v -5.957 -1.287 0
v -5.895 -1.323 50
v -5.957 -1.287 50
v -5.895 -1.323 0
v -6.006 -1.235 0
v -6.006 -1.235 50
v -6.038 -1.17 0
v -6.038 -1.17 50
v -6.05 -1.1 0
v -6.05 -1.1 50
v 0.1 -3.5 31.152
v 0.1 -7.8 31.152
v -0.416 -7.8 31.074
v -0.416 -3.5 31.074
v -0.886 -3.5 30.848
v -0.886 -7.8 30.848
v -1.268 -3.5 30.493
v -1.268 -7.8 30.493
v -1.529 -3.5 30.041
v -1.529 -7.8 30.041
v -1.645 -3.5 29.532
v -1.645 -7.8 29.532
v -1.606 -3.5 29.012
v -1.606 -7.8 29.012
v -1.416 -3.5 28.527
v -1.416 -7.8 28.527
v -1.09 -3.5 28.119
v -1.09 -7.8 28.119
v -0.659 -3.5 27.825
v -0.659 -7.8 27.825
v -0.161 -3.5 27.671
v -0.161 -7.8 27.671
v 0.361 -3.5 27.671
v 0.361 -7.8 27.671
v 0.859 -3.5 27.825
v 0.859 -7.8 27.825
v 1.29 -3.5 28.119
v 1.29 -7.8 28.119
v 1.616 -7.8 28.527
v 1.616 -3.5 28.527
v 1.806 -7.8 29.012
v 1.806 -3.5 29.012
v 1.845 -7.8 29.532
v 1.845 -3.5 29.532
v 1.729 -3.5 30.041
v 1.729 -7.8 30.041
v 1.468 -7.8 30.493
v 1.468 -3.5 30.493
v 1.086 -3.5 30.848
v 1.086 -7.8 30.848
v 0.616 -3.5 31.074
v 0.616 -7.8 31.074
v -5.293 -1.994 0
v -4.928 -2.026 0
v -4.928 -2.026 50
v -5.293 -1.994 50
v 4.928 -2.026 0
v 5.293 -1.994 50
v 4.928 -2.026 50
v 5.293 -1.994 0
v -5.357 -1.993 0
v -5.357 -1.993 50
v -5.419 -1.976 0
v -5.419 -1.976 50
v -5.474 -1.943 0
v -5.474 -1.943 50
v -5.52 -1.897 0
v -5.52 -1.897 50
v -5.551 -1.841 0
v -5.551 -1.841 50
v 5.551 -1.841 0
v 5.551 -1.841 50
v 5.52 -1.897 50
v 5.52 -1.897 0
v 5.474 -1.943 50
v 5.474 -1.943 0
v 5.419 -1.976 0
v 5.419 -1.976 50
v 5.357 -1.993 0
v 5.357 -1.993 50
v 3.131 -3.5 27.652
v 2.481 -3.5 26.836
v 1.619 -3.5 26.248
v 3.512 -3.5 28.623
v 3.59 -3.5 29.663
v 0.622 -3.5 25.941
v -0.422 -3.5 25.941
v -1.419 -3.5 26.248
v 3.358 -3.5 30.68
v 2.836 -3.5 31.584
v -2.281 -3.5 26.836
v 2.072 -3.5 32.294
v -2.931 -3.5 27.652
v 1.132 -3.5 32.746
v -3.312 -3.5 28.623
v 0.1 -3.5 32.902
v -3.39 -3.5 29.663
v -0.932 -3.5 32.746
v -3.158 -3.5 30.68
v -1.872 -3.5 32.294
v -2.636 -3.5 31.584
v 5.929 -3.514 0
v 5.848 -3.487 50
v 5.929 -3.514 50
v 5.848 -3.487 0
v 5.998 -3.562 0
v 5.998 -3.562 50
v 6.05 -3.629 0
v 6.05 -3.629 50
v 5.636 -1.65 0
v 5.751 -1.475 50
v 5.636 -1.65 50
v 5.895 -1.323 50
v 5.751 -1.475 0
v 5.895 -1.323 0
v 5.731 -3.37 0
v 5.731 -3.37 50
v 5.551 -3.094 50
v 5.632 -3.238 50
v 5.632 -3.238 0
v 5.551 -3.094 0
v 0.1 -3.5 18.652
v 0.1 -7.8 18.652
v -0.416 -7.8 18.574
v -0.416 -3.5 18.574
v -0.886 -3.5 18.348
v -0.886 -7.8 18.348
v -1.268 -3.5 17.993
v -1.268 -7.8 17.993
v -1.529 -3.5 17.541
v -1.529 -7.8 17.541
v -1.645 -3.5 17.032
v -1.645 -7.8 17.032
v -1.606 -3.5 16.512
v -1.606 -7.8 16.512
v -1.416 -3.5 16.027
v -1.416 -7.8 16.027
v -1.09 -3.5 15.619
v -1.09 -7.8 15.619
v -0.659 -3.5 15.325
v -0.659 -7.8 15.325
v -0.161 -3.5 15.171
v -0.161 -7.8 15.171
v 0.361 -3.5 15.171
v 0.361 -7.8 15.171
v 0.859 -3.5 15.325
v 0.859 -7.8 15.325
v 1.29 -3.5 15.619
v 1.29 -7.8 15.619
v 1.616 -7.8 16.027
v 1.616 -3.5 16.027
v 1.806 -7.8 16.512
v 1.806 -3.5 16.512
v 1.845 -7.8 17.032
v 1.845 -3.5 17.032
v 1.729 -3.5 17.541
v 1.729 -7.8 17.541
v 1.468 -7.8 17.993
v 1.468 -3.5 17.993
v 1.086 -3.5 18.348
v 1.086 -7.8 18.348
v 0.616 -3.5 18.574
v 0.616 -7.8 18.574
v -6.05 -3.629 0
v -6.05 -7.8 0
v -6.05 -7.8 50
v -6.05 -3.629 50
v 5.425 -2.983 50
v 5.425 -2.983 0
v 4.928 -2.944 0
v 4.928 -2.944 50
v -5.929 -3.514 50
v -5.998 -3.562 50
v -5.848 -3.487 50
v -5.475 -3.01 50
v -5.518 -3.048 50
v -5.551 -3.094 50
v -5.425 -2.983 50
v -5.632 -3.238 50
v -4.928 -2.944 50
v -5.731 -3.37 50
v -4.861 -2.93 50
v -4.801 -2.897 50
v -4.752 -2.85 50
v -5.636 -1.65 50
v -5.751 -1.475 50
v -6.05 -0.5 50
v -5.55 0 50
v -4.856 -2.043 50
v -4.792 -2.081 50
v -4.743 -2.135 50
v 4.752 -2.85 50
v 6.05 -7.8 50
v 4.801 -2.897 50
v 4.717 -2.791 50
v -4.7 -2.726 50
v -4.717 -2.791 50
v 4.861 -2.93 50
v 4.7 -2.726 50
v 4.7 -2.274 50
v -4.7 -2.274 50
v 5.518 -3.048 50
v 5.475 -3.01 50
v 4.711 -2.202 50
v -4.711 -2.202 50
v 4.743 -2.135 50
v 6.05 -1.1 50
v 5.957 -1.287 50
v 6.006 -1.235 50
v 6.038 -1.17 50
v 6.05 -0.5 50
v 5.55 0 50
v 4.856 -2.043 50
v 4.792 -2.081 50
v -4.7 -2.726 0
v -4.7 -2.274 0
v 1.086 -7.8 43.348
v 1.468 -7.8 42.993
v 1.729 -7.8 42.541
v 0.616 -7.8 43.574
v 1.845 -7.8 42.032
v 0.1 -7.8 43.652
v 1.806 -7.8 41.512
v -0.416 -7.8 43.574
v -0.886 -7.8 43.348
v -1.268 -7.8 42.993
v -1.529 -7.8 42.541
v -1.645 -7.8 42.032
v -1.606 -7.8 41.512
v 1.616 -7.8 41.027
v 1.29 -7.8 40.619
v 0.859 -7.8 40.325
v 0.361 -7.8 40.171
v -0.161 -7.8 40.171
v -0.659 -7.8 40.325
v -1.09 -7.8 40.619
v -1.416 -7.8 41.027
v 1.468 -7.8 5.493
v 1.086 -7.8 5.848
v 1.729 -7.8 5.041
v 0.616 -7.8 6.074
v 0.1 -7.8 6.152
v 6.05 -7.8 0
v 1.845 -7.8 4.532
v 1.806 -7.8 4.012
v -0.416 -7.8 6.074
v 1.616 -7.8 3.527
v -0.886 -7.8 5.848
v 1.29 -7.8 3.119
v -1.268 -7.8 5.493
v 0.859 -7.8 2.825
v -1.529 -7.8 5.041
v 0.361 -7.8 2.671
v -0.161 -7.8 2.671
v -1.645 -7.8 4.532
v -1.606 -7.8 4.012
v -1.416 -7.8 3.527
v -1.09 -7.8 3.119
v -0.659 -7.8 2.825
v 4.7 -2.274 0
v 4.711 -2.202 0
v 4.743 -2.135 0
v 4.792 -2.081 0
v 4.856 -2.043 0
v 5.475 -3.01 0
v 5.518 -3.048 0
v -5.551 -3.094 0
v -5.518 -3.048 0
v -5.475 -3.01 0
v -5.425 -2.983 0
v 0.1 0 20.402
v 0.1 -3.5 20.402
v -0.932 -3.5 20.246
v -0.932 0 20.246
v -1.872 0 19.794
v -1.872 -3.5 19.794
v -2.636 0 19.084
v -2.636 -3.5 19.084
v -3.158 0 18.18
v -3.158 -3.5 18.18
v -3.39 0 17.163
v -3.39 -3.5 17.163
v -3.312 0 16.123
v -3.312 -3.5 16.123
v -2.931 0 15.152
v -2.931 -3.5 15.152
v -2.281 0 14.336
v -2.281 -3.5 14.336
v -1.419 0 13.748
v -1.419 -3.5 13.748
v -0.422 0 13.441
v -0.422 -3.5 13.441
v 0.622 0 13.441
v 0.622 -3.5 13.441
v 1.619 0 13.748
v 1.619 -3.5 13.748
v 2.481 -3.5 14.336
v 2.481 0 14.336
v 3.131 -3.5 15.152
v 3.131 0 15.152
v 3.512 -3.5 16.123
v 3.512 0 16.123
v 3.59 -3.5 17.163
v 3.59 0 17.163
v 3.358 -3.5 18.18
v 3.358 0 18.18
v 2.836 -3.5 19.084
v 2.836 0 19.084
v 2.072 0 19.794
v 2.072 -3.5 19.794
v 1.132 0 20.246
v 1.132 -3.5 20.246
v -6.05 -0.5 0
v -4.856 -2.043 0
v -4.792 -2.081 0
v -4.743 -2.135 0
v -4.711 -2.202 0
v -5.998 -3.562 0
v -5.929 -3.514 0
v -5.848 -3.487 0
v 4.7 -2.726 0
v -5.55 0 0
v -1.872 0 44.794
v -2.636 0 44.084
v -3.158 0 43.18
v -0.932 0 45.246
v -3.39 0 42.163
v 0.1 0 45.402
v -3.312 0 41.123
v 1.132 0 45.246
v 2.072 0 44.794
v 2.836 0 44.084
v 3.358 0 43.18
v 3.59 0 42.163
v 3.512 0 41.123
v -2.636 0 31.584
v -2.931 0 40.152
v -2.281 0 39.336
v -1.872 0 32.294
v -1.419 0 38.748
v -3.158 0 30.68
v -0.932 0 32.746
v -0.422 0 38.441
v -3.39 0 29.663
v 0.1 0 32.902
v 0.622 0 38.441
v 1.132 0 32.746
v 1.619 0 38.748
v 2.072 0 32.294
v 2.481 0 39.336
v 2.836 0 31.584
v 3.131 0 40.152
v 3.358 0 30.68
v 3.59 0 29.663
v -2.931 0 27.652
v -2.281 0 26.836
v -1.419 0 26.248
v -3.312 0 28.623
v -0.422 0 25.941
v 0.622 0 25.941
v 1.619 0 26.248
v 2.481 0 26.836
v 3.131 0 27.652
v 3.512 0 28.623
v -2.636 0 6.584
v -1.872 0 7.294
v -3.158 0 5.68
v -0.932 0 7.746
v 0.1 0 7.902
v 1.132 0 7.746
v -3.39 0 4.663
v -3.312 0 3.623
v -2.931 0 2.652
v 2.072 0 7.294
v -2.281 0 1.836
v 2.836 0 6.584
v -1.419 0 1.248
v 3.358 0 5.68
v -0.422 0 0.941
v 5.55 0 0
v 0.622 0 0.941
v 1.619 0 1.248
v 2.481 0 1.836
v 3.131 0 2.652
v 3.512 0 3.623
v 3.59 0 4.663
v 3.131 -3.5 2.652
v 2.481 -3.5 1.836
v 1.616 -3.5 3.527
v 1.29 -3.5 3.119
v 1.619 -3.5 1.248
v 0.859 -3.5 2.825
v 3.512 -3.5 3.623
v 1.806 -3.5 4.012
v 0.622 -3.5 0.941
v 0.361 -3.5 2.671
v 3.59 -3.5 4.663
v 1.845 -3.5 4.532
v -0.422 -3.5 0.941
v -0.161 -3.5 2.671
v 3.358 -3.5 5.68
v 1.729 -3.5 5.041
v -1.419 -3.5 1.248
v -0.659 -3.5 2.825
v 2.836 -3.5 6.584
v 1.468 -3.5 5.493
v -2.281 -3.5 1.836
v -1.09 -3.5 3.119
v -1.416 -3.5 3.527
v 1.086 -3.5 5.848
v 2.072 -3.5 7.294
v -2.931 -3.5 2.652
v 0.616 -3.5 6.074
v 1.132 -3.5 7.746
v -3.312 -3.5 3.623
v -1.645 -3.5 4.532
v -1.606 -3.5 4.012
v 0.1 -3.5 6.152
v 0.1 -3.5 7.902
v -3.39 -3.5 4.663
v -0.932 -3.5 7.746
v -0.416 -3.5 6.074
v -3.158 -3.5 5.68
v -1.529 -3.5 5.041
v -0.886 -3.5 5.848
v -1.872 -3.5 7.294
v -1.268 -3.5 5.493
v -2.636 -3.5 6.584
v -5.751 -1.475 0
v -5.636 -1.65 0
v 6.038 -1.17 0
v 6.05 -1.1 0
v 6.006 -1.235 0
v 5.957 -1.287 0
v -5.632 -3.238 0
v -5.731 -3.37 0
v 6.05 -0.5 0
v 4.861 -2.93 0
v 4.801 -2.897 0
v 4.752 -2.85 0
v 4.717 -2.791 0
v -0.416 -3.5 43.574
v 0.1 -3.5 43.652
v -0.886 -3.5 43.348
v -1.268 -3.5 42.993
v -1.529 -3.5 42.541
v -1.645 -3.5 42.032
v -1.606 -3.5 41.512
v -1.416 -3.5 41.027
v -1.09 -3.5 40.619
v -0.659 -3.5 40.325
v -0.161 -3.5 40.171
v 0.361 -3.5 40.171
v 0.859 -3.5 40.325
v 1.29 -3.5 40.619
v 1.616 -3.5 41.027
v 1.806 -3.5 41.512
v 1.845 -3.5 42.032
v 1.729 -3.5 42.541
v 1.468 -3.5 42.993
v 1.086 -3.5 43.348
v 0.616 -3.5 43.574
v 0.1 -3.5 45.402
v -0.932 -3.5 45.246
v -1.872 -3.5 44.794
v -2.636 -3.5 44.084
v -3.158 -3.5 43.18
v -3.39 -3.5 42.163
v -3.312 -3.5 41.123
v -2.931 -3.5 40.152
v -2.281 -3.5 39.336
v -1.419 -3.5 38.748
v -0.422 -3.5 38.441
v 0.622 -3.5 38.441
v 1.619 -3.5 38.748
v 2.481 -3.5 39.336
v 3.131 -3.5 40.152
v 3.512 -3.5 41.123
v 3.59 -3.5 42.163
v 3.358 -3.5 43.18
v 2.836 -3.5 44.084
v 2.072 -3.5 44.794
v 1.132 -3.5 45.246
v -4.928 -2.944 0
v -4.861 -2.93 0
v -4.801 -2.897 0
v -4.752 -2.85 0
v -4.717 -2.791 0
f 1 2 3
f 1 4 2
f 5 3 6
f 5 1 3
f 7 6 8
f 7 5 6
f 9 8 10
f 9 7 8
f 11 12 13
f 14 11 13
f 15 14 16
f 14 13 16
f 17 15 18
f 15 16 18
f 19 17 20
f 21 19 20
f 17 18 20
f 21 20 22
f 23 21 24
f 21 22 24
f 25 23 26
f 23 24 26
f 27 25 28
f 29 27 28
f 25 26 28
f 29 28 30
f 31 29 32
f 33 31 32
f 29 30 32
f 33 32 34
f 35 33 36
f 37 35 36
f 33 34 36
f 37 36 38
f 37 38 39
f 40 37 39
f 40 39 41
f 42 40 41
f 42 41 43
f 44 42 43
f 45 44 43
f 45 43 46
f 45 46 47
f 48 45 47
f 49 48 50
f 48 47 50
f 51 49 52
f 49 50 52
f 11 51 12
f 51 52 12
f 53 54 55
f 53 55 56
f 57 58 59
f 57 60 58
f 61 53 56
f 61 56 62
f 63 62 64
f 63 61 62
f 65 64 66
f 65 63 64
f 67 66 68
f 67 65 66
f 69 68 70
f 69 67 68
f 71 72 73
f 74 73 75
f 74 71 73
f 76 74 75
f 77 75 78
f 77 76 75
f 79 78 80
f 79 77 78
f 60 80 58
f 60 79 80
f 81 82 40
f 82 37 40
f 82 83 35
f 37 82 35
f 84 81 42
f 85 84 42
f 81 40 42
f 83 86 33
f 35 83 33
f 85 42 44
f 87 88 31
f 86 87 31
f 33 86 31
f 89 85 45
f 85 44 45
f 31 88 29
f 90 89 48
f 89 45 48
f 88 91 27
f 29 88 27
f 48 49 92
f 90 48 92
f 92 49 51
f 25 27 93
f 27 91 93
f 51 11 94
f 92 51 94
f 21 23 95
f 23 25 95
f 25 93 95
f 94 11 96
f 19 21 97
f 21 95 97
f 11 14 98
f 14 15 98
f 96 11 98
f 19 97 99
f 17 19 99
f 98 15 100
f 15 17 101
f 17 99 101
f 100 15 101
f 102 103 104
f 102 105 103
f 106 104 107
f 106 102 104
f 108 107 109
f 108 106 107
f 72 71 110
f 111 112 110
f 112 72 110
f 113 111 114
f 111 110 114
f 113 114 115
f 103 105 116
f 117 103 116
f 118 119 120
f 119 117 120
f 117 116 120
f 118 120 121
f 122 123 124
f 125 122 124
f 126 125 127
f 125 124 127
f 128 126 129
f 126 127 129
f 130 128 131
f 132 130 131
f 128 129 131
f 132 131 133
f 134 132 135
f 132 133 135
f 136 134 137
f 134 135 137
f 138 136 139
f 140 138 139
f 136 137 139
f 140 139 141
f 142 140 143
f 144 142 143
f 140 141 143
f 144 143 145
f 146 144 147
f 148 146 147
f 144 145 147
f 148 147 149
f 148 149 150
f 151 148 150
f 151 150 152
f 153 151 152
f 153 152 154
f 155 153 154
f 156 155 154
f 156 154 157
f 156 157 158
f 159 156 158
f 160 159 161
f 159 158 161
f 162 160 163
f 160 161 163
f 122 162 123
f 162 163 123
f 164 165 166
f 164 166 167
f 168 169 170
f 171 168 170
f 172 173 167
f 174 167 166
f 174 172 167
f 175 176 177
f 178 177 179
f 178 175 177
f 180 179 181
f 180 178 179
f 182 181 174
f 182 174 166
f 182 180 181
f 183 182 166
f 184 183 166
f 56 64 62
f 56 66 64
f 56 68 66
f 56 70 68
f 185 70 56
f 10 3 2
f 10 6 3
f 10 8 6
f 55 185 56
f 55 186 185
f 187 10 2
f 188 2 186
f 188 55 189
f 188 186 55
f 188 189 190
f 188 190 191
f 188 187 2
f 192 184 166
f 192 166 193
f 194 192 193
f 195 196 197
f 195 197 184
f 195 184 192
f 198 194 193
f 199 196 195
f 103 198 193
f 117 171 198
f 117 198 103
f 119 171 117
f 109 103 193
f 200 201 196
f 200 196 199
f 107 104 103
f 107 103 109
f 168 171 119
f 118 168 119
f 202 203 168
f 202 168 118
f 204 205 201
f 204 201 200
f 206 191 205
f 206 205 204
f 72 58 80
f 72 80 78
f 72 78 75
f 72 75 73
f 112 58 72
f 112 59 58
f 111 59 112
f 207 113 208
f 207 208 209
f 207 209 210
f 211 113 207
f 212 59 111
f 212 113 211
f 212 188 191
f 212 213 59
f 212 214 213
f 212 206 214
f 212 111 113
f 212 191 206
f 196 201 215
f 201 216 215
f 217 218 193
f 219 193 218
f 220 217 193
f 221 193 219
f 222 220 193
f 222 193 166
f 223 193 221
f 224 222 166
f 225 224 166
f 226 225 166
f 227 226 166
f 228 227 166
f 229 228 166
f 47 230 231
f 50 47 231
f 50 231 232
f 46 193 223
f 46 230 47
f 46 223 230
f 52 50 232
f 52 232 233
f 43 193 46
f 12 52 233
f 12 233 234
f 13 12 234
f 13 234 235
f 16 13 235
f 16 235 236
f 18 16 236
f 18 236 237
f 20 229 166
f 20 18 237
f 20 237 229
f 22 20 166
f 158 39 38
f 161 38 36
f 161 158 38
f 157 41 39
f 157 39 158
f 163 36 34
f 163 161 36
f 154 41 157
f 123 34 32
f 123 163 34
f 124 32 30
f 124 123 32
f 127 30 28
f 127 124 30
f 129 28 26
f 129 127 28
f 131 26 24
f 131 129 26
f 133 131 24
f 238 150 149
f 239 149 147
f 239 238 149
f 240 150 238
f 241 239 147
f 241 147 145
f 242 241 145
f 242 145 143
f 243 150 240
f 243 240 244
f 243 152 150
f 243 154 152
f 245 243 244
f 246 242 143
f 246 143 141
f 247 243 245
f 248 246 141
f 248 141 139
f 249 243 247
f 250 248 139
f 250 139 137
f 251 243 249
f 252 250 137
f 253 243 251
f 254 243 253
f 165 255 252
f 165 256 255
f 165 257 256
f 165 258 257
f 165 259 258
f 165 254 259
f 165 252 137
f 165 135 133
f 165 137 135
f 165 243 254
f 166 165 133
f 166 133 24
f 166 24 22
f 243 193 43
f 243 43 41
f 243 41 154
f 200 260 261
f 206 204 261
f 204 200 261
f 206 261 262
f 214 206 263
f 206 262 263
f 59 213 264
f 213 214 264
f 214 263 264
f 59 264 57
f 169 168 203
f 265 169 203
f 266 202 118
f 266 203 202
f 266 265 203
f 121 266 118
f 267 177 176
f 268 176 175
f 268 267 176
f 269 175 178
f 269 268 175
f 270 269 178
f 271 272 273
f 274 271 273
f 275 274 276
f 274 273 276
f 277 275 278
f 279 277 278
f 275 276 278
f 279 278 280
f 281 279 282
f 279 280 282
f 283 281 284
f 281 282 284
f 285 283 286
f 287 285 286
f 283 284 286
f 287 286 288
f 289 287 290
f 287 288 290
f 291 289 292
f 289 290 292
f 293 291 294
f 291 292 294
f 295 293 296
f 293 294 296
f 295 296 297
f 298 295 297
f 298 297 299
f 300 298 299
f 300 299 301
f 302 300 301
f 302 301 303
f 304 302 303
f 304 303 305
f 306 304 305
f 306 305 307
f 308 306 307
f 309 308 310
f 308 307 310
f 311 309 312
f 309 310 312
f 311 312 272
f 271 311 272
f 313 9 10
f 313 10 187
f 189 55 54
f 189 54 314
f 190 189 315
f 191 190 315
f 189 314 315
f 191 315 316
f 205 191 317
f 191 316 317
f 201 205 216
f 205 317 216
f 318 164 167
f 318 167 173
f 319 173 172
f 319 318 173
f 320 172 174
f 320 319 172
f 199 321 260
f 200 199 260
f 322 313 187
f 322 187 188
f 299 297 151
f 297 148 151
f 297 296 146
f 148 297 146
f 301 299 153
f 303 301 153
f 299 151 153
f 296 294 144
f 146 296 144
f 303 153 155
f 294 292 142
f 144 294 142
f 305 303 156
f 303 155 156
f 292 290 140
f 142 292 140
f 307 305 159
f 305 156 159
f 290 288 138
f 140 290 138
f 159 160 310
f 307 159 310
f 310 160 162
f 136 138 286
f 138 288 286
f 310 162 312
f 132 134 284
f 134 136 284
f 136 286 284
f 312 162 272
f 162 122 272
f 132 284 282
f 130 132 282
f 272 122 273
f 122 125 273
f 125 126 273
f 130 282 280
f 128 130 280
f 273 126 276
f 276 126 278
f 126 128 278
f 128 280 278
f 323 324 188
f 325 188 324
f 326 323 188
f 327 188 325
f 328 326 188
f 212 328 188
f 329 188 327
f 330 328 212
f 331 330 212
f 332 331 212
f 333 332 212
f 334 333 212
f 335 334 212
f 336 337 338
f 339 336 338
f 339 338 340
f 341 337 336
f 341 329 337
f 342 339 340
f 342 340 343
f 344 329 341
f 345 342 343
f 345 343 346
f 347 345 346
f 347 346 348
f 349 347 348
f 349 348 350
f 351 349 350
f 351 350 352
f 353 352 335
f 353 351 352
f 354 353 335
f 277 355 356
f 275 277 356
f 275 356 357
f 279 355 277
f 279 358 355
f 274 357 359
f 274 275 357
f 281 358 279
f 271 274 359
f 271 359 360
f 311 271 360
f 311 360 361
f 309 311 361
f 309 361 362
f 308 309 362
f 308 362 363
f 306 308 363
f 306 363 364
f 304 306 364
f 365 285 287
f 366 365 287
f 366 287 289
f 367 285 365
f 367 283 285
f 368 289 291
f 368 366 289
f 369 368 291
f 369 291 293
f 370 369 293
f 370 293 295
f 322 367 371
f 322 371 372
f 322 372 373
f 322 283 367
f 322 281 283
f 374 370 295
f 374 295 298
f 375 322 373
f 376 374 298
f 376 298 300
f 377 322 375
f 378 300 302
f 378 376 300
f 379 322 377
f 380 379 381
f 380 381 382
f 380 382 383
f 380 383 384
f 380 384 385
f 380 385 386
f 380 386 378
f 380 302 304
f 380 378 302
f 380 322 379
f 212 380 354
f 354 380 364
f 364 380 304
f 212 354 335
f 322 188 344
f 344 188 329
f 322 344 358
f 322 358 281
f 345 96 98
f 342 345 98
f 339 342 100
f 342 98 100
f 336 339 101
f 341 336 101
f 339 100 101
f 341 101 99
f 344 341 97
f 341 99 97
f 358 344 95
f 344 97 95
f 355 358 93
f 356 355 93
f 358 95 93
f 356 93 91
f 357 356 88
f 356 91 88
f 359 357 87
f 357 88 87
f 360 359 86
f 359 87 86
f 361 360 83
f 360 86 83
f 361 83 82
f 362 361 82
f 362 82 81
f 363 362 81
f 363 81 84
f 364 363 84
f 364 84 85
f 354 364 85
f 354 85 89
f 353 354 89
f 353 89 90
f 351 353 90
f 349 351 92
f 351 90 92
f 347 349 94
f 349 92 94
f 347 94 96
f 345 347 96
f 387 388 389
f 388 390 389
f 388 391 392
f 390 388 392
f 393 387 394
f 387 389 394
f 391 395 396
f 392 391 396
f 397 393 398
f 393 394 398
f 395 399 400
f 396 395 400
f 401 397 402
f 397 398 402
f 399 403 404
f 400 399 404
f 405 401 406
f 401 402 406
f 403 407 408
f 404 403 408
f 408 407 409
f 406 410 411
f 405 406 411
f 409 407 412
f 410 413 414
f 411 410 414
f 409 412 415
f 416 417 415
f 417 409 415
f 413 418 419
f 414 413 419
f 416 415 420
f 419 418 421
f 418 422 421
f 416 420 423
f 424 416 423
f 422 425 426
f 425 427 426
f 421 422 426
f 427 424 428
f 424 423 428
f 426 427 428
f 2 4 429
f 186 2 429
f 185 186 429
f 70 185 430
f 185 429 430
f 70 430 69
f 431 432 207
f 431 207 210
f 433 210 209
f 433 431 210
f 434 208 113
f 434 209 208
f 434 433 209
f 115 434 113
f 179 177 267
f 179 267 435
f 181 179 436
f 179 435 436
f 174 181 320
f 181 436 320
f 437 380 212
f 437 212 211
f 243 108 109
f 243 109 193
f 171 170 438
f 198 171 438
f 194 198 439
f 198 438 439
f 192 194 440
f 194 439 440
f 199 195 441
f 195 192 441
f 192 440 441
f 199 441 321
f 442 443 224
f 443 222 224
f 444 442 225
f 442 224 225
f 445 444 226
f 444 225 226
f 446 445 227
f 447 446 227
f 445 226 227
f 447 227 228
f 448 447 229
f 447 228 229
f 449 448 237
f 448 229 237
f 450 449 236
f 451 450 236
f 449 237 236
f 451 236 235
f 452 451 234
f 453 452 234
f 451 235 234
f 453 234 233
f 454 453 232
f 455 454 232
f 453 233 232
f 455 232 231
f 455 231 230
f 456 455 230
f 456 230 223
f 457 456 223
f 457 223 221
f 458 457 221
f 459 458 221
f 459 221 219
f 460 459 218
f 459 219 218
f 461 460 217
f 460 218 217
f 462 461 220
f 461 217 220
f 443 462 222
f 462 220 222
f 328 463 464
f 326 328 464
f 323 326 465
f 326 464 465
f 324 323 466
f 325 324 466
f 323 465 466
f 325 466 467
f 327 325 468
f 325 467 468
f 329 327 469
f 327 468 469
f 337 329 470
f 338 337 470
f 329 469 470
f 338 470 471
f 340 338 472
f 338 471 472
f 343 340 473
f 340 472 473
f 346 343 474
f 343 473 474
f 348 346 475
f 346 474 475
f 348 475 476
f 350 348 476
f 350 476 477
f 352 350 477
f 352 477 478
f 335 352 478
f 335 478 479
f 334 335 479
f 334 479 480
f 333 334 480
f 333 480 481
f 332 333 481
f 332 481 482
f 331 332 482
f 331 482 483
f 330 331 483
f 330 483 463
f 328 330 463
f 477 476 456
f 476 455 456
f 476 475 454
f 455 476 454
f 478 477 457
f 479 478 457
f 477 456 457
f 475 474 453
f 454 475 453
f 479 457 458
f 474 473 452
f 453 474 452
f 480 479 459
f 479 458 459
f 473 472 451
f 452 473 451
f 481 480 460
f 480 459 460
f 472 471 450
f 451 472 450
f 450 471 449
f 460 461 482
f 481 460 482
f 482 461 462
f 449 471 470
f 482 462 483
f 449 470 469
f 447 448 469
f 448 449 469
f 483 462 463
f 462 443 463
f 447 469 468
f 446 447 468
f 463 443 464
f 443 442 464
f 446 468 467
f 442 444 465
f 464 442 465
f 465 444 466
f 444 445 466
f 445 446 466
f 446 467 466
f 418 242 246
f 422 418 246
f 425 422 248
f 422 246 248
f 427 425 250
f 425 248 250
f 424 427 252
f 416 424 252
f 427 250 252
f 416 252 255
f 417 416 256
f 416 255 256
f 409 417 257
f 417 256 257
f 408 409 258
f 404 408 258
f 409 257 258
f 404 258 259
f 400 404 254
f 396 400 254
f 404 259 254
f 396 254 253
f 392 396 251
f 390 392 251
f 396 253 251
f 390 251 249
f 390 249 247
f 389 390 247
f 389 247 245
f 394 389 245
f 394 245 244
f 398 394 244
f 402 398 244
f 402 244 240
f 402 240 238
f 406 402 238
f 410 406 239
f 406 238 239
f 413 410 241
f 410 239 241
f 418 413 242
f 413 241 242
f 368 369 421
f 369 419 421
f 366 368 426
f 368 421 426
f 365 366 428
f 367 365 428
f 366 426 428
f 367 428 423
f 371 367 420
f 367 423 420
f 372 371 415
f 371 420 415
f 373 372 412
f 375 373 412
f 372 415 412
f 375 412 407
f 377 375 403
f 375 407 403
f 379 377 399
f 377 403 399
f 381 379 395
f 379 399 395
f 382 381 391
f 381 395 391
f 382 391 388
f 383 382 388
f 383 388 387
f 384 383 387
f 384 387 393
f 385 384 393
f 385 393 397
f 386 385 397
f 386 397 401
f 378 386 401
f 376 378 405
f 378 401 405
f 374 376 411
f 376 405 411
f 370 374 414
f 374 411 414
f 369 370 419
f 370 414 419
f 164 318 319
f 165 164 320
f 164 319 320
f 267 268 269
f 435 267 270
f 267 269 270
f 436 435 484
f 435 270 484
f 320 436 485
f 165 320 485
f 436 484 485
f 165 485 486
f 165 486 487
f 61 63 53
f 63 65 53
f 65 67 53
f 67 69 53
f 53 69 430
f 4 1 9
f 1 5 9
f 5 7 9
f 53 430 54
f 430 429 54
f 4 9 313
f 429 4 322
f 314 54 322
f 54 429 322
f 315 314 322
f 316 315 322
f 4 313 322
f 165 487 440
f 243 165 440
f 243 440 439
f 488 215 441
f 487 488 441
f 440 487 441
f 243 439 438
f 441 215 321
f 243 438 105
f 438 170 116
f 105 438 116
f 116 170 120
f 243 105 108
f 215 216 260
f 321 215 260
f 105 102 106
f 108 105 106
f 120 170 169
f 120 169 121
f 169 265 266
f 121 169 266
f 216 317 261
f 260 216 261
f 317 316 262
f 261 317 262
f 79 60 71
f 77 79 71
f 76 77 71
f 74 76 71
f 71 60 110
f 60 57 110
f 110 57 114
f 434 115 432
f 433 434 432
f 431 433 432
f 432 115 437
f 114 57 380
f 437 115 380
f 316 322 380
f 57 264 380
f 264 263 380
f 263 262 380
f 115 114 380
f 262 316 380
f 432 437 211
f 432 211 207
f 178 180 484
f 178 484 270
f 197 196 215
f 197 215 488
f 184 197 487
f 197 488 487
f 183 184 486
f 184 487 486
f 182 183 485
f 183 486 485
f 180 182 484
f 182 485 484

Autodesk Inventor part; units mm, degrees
ref_plane "YZ Plane" through (0, 0, 0) normal (1, 0, 0) x (0, 1, 0)
ref_plane "XZ Plane" through (0, 0, 0) normal (0, 1, 0) x (-1, 0, 0)
ref_plane "XY Plane" through (0, 0, 0) normal (0, 0, 1) x (1, 0, 0)
ref_plane "Work Plane1" through (0, 0, 0) normal (0, 0, 1) x (1, 0, 0)
sketch "Sketch1" plane through (0, 0, 0) normal (0, 0, 1) x (1, 0, 0)
  line L0 (0, 0) -> (5.55, 0)
  line L1 (6.05, -7.8) -> (0, -7.8)
  line L2 (0, -7.8) -> (0, 0)
  line L3 (5.55, 0) -> (6.05, -0.5)
  arc A0 (6.05, -3.6294) -> (5.8482, -3.4873) centre (5.8013, -3.7683) ccw
  arc A1 (5.5514, -3.0941) -> (5.8482, -3.4873) centre (6.6343, -2.5853) ccw
  arc A2 (5.5514, -3.0941) -> (5.425, -2.9829) centre (5.3332, -3.2146) ccw
  line L4 (5.425, -2.9829) -> (4.928, -2.9441)
  arc A3 (4.7, -2.7255) -> (4.928, -2.9441) centre (4.9475, -2.6956) ccw
  arc A4 (4.9275, -2.0261) -> (4.7, -2.2744) centre (4.9493, -2.2744) ccw
  arc A5 (5.293, -1.9942) -> (5.5514, -1.8412) centre (5.3208, -1.7464) ccw
  arc A6 (5.8954, -1.3233) -> (5.5514, -1.8412) centre (6.7024, -2.2326) ccw
  arc A7 (5.8954, -1.3233) -> (6.05, -1.1) centre (5.8008, -1.0927) ccw
  line L5 (5.293, -1.9942) -> (4.9275, -2.0261)
  line L6 (4.7, -2.7255) -> (4.7, -2.2744)
  line L7 (6.05, -0.5) -> (6.05, -1.1)
  line L8 (6.05, -3.6294) -> (6.05, -7.8)
  point P0 (6.05, 0)
  dimension "d0" = 0.5
  dimension "d1" = 0.5
  dimension "d17" = 6.05
  dimension "d18" = 7.8
  dimension "d20" = 2.6756
  dimension "d21" = 0.5
  dimension "d22" = 1.1
  dimension "d23" = 4.7
  dimension "d24" = 0.2275
  dimension "d25" = 0.228
  dimension "d26" = 0
  dimension "d27" = 0.2483
  dimension "d28" = 0.2186
extrude "Extrusion1" add sketch "Sketch1" along normal blind 50
mirror "Mirror1" about plane through (0, 0, 0) normal (-1, 0, 0) of "Extrusion1"
sketch "Sketch2" plane through (5.55, 0, 50) normal (0, 1, 0) x (1, 0, 0)
  line L0 (-11.1, 50) -> (0, 50) projected
  line L1 (-11.1, 50) -> (-11.1, 0) projected
  line L2 (0, 0) -> (-11.1, 0) projected
  line L3 (0, 50) -> (0, 0) projected
  point P0 (-5.55, 50)
  point P1 (-5.45, 45.5983)
hole "Hole1" at (0.1, 0, 4.4017) direction (0, -1, 0) diameter 3.5 end through all counterbore diameter 7 counterbore depth 3.5
pattern_linear "Rectangular Pattern1" count 5 spacing 12.5 along (0, 0, 1) of "Hole1"
ref_plane "Work Plane2" through (0, -7.8, 0) normal (1, 0, 0) x (0, 0, -1)
ref_plane "Arbeitsebene3" through (0, 0, 25) normal (0, 0, 1) x (1, 0, 0)
equation "\"d1\" = d0"
properties part number "30_Cube_Z_Focus_MGN_NEMA_rail"
